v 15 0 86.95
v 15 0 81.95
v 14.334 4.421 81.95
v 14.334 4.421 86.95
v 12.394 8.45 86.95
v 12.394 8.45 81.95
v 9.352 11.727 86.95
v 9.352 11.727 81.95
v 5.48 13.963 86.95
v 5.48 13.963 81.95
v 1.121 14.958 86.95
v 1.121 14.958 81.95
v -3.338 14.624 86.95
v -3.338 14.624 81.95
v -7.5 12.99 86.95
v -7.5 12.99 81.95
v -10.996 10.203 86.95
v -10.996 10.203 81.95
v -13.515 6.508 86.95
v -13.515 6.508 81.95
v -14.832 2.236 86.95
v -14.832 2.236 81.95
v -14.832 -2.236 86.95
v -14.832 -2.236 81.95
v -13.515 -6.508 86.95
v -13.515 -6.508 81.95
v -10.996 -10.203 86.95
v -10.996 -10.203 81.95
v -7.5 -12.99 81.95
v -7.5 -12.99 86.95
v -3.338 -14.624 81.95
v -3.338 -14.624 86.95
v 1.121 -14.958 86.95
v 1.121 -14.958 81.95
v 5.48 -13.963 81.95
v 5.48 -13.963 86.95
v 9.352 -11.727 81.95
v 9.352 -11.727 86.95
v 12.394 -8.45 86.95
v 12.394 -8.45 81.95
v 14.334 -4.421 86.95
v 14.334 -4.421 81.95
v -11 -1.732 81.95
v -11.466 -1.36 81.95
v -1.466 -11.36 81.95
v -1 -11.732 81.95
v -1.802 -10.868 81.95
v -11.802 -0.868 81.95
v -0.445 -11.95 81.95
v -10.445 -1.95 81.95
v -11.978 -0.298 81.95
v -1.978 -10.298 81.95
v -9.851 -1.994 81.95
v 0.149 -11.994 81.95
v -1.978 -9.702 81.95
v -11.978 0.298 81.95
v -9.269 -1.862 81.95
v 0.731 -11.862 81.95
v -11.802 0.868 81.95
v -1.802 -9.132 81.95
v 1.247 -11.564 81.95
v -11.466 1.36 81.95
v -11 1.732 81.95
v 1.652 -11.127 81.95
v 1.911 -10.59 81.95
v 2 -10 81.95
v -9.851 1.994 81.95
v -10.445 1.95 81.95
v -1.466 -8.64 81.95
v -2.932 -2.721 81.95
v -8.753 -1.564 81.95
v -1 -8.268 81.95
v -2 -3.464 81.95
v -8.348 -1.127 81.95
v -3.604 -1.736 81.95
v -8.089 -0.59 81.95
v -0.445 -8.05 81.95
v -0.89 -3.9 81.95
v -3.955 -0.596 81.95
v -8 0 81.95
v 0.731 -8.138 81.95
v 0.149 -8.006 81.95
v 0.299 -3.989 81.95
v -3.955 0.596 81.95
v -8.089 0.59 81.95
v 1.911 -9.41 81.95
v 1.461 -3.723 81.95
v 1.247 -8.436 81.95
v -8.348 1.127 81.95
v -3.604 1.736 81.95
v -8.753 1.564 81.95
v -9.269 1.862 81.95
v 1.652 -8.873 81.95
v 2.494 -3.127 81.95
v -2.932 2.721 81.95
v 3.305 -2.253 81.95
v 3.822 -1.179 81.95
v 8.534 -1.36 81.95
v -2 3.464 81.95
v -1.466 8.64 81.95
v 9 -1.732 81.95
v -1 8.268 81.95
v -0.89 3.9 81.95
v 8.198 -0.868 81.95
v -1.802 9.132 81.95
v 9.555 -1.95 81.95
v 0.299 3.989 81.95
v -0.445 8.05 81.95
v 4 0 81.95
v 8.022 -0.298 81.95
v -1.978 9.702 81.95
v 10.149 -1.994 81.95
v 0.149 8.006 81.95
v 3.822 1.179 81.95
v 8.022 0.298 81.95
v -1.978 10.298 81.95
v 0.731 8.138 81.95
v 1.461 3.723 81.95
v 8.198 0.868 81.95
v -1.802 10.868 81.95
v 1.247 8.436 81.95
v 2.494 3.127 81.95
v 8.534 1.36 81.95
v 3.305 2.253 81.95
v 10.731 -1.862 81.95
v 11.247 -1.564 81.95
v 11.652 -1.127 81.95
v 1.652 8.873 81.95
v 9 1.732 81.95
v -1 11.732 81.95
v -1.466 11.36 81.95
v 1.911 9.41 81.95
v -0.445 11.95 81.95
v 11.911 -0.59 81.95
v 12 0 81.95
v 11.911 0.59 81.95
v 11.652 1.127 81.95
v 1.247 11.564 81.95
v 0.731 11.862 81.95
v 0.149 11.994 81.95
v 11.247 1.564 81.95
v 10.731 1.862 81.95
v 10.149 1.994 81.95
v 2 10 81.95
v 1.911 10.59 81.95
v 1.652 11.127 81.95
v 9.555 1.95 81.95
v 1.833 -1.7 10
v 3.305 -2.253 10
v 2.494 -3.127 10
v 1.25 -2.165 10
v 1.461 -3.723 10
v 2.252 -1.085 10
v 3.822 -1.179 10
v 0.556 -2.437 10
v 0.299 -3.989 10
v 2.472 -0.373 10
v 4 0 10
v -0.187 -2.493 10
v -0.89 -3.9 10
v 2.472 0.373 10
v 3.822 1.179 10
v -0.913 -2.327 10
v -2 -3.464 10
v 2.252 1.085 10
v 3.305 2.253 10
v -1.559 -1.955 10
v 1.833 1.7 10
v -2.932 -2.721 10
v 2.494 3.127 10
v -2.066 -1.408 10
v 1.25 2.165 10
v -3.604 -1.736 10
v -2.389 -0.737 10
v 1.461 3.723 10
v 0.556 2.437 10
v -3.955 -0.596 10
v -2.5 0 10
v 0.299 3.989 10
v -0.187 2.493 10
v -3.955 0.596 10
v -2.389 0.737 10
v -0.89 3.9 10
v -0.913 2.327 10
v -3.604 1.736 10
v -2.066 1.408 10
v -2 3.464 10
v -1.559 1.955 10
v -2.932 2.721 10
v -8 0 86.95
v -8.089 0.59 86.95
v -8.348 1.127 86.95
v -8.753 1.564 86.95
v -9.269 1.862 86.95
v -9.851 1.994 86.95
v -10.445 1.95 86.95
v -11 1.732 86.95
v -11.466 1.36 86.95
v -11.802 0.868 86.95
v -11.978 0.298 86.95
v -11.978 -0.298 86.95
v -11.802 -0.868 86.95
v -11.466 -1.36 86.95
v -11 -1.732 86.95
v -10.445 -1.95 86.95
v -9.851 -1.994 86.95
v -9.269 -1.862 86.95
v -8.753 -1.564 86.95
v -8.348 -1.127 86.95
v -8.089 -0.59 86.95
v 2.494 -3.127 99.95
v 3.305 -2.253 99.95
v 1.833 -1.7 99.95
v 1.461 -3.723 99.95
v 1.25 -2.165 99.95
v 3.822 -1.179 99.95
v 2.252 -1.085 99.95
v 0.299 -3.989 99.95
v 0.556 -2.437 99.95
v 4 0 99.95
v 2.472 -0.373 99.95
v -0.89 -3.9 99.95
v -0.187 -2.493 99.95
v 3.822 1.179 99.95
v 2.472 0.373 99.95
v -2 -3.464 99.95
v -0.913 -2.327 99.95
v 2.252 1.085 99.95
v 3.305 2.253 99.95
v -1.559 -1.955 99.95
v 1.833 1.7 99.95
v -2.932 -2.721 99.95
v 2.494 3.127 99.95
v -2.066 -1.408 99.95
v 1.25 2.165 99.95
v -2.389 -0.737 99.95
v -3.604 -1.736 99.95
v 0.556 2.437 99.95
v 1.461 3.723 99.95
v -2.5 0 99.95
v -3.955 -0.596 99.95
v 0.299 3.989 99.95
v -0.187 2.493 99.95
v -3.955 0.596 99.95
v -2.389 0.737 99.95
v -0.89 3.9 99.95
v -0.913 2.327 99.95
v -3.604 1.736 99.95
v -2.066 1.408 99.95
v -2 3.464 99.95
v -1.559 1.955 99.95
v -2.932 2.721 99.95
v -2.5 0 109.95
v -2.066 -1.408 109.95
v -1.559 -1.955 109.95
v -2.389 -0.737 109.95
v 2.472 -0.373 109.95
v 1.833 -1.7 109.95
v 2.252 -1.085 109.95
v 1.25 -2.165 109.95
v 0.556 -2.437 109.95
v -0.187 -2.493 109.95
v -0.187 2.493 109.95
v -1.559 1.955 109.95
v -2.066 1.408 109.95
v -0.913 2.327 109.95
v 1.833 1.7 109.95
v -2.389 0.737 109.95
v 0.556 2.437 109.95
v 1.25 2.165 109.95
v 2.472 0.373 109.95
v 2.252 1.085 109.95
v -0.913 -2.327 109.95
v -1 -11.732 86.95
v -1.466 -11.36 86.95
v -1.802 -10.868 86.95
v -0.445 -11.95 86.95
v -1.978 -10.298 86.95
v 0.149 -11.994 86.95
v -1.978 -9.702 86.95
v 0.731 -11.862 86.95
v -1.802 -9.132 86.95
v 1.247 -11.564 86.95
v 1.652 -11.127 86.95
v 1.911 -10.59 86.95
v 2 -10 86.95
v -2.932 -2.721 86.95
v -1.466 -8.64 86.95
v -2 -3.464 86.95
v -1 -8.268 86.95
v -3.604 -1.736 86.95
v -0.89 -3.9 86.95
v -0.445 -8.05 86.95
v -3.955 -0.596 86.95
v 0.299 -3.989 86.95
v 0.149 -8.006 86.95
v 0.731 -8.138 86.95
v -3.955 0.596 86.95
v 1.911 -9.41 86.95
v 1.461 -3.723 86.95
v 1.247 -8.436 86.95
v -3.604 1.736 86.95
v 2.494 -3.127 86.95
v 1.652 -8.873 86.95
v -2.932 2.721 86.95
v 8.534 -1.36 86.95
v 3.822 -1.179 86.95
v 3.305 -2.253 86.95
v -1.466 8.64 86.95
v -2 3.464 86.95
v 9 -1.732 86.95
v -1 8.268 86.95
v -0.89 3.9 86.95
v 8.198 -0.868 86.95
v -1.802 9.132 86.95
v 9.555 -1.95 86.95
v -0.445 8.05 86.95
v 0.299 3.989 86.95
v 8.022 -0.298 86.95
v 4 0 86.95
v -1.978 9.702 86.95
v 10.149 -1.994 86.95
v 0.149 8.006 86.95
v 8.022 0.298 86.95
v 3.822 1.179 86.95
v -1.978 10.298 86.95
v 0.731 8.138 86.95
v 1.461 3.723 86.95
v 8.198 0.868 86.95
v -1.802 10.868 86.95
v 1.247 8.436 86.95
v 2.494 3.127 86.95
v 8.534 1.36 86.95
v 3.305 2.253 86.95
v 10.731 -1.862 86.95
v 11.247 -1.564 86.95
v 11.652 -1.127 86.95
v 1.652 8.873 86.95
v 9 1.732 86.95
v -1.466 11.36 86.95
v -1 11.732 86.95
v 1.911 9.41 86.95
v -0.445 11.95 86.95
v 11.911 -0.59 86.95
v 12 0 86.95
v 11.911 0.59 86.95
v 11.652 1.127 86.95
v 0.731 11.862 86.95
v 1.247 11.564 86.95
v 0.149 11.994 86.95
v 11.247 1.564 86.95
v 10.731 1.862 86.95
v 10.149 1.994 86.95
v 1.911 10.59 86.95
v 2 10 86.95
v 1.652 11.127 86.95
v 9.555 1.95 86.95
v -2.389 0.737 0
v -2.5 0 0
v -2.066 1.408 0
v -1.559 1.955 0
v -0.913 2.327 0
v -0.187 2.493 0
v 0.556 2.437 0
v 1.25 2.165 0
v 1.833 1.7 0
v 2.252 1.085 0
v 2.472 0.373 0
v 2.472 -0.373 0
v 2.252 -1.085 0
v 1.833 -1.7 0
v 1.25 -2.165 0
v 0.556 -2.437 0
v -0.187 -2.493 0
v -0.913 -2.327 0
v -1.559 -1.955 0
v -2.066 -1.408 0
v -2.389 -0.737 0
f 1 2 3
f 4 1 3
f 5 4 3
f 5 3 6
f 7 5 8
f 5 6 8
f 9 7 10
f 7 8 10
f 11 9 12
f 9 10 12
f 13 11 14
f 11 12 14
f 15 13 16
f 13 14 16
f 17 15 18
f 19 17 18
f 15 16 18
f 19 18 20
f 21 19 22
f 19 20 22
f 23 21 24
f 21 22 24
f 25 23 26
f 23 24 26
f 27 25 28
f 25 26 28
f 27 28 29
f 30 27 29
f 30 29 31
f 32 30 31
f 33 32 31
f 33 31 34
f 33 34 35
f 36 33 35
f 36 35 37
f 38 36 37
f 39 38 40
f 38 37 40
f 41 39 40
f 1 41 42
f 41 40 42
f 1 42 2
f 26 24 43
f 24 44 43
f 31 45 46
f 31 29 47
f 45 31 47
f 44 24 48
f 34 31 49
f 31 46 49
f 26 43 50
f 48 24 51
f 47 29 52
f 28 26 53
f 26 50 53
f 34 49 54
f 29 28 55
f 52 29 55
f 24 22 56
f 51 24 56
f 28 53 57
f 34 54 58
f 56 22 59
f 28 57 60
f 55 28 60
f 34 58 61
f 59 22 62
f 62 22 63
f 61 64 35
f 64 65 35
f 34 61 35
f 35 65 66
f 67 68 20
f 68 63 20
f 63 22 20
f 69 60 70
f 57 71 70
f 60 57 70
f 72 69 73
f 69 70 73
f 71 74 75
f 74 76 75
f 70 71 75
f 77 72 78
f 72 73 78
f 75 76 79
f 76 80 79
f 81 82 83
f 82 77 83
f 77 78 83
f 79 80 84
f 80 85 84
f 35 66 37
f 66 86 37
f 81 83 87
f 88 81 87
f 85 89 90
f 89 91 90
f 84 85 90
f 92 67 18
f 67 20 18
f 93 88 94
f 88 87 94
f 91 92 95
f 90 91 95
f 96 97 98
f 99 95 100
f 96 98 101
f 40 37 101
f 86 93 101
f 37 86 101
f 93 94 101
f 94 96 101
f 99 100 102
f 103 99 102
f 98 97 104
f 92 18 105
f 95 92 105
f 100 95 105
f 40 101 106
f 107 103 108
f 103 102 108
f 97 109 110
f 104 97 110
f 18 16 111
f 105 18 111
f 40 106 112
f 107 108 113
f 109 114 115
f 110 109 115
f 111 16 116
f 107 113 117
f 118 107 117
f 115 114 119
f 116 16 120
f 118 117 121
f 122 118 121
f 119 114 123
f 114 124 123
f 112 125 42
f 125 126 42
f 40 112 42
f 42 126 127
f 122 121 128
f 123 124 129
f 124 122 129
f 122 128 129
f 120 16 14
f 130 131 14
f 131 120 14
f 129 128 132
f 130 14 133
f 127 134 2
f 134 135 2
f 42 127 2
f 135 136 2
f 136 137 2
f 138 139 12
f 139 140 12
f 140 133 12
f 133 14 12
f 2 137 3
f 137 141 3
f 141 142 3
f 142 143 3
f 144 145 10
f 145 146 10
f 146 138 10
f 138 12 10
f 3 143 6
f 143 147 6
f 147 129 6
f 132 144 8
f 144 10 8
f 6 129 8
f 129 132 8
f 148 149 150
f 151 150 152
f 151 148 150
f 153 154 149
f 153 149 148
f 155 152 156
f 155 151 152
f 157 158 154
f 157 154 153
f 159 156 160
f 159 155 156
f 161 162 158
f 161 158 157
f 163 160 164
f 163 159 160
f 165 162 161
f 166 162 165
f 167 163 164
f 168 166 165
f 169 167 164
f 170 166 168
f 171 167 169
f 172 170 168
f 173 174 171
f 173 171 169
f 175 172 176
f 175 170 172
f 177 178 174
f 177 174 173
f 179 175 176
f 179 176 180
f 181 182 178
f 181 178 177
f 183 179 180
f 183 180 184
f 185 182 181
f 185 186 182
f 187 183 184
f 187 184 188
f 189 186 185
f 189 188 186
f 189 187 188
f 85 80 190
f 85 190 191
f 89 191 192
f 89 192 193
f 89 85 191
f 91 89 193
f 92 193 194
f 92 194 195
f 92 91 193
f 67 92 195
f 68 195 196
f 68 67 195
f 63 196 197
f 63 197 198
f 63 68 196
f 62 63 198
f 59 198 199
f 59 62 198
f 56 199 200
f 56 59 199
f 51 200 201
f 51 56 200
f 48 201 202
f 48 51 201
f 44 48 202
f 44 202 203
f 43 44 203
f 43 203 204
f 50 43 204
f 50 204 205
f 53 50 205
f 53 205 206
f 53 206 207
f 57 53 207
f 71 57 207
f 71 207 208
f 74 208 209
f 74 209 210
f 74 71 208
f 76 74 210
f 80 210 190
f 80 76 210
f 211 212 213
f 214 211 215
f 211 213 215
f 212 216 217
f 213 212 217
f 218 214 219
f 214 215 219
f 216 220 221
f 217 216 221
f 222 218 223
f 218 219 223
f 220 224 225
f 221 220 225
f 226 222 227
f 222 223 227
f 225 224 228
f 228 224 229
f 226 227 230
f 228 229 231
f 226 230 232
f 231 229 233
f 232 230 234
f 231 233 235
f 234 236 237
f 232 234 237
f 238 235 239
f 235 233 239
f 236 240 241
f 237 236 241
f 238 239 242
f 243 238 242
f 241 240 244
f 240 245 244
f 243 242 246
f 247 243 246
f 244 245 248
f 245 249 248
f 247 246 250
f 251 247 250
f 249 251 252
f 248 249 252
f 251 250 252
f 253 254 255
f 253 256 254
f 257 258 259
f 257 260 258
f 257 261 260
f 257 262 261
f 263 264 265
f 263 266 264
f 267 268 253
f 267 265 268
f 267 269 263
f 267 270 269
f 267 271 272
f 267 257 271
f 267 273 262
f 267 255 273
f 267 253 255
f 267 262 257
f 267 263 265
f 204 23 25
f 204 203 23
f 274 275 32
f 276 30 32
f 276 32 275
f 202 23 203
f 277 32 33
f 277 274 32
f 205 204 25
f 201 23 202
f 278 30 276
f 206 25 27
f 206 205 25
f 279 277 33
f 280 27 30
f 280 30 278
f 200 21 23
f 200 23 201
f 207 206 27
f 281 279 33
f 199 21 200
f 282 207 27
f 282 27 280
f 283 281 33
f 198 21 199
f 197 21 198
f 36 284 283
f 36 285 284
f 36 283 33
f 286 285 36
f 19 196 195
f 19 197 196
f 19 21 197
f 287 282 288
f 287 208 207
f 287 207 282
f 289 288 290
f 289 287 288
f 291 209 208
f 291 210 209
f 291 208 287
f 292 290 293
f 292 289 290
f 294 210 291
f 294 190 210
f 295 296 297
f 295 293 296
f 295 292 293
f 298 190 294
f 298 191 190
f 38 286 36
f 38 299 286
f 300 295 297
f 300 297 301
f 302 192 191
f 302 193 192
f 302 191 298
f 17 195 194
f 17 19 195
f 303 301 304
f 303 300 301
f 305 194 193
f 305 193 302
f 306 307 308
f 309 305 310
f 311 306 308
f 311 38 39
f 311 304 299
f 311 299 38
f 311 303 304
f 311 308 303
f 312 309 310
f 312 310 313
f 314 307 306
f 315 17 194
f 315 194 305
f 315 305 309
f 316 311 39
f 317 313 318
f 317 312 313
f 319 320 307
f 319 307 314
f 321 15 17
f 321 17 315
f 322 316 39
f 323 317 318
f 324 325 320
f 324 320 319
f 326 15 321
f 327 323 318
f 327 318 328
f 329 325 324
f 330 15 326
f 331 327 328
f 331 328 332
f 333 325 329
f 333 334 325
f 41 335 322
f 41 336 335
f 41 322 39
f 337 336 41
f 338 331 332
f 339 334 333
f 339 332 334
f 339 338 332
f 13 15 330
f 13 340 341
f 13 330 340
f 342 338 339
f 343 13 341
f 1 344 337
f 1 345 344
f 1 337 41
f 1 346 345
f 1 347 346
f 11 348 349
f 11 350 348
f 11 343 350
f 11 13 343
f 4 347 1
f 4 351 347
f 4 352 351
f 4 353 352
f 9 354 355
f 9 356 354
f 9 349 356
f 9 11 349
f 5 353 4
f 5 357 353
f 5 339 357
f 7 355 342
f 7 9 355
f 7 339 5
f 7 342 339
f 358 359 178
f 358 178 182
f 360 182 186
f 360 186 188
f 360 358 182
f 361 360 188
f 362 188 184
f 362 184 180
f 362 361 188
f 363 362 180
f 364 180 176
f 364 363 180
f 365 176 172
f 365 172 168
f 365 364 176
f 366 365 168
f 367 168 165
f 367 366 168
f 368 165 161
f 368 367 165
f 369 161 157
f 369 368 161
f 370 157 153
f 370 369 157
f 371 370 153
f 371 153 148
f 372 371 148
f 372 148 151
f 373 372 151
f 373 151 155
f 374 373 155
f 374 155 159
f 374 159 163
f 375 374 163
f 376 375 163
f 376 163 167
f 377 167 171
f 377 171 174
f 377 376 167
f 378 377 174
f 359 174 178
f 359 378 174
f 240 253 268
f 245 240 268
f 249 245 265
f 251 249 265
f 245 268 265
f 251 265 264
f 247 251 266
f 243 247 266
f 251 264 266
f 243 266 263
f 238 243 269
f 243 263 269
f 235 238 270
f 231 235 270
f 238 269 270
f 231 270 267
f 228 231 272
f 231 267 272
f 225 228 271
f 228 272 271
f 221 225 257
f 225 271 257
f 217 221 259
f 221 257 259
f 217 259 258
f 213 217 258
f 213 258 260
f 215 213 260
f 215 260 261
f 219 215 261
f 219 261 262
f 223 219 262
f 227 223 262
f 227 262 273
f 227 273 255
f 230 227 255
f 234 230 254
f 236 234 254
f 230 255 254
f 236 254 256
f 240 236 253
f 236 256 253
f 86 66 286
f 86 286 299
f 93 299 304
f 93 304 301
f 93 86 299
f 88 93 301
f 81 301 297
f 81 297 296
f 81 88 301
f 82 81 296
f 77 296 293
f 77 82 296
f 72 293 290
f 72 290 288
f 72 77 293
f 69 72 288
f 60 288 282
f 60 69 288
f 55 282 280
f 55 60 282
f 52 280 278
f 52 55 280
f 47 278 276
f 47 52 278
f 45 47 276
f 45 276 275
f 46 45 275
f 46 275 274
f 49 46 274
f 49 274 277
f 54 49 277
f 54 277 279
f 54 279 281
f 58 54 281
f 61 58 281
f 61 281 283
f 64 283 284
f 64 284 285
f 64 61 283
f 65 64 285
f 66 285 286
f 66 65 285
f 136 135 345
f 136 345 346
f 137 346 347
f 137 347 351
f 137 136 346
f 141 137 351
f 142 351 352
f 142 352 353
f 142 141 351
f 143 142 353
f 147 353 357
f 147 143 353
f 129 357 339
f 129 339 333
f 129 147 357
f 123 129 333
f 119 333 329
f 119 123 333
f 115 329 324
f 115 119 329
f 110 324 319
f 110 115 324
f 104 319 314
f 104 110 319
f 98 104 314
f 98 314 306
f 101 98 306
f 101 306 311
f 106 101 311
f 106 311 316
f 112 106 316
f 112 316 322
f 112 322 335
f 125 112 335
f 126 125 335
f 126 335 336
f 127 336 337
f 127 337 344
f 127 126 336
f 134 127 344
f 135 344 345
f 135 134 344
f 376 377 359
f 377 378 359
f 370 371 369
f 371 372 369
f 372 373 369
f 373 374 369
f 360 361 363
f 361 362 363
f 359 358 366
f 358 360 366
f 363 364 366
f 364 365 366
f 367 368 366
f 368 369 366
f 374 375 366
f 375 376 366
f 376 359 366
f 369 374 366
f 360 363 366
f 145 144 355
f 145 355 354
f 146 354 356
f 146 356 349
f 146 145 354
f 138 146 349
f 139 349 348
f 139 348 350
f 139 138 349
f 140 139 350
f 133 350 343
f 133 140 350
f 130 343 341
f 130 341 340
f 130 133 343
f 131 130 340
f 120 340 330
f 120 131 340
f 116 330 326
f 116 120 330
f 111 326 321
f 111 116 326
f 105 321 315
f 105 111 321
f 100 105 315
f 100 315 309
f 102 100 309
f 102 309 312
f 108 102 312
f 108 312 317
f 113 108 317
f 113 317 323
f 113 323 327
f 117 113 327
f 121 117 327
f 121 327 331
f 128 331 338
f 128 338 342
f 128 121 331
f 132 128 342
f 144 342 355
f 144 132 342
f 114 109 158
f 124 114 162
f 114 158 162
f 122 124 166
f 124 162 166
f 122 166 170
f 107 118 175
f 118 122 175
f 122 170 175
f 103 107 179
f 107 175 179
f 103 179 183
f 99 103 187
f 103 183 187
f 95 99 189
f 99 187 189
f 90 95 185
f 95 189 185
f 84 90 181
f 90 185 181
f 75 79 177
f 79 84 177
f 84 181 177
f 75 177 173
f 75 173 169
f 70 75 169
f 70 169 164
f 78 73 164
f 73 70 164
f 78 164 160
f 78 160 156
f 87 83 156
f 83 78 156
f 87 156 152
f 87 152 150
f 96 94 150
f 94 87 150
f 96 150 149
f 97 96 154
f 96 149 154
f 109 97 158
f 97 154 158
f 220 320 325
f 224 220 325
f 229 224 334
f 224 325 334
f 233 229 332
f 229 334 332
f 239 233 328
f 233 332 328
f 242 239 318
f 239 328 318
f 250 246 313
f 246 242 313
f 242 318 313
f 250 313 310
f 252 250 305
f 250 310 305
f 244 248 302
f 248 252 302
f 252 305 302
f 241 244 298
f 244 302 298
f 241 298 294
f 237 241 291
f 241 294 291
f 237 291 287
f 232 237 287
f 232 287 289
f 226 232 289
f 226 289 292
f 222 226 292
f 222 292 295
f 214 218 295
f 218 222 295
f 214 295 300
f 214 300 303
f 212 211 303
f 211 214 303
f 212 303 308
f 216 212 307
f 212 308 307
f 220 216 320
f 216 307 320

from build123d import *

# Parameters (mm, degrees)
SKETCH1_R           = 4
BOSS_EXTRUDE1_DEPTH = 109.95
SKETCH2_R           = 4
SKETCH2_R_2         = 2.5
CUT_EXTRUDE1_DEPTH  = 10
SKETCH3_R           = 15
SKETCH3_R_2         = 2
BOSS_EXTRUDE2_DEPTH = 5


with BuildPart() as part:
    # Sketch1 → Boss-Extrude1 (new body)
    with BuildSketch(Plane.XY):
        Circle(SKETCH1_R)
    extrude(amount=BOSS_EXTRUDE1_DEPTH)

    # Sketch2 → Cut-Extrude1 (cut)
    with BuildSketch(Plane(origin=(0, 0, 0), x_dir=(-1, 0, 0), z_dir=(0, 0, -1))):
        Circle(SKETCH2_R)
        Circle(SKETCH2_R_2, mode=Mode.SUBTRACT)
    cut_extrude1 = extrude(amount=-CUT_EXTRUDE1_DEPTH, mode=Mode.SUBTRACT)

    # Mirror1: Cut-Extrude1 across plane
    add(cut_extrude1.mirror(Plane.XY.offset(54.975)), mode=Mode.SUBTRACT)

    # Sketch3 → Boss-Extrude2 (add)
    with BuildSketch(Plane.XY.offset(81.95)):
        Circle(SKETCH3_R)
        with Locations((0, 10)):
            Circle(SKETCH3_R_2, mode=Mode.SUBTRACT)
        with Locations((10, 0)):
            Circle(SKETCH3_R_2, mode=Mode.SUBTRACT)
        with Locations((0, -10)):
            Circle(SKETCH3_R_2, mode=Mode.SUBTRACT)
        with Locations((-10, 0)):
            Circle(SKETCH3_R_2, mode=Mode.SUBTRACT)
    extrude(amount=BOSS_EXTRUDE2_DEPTH)


solid = part.part
